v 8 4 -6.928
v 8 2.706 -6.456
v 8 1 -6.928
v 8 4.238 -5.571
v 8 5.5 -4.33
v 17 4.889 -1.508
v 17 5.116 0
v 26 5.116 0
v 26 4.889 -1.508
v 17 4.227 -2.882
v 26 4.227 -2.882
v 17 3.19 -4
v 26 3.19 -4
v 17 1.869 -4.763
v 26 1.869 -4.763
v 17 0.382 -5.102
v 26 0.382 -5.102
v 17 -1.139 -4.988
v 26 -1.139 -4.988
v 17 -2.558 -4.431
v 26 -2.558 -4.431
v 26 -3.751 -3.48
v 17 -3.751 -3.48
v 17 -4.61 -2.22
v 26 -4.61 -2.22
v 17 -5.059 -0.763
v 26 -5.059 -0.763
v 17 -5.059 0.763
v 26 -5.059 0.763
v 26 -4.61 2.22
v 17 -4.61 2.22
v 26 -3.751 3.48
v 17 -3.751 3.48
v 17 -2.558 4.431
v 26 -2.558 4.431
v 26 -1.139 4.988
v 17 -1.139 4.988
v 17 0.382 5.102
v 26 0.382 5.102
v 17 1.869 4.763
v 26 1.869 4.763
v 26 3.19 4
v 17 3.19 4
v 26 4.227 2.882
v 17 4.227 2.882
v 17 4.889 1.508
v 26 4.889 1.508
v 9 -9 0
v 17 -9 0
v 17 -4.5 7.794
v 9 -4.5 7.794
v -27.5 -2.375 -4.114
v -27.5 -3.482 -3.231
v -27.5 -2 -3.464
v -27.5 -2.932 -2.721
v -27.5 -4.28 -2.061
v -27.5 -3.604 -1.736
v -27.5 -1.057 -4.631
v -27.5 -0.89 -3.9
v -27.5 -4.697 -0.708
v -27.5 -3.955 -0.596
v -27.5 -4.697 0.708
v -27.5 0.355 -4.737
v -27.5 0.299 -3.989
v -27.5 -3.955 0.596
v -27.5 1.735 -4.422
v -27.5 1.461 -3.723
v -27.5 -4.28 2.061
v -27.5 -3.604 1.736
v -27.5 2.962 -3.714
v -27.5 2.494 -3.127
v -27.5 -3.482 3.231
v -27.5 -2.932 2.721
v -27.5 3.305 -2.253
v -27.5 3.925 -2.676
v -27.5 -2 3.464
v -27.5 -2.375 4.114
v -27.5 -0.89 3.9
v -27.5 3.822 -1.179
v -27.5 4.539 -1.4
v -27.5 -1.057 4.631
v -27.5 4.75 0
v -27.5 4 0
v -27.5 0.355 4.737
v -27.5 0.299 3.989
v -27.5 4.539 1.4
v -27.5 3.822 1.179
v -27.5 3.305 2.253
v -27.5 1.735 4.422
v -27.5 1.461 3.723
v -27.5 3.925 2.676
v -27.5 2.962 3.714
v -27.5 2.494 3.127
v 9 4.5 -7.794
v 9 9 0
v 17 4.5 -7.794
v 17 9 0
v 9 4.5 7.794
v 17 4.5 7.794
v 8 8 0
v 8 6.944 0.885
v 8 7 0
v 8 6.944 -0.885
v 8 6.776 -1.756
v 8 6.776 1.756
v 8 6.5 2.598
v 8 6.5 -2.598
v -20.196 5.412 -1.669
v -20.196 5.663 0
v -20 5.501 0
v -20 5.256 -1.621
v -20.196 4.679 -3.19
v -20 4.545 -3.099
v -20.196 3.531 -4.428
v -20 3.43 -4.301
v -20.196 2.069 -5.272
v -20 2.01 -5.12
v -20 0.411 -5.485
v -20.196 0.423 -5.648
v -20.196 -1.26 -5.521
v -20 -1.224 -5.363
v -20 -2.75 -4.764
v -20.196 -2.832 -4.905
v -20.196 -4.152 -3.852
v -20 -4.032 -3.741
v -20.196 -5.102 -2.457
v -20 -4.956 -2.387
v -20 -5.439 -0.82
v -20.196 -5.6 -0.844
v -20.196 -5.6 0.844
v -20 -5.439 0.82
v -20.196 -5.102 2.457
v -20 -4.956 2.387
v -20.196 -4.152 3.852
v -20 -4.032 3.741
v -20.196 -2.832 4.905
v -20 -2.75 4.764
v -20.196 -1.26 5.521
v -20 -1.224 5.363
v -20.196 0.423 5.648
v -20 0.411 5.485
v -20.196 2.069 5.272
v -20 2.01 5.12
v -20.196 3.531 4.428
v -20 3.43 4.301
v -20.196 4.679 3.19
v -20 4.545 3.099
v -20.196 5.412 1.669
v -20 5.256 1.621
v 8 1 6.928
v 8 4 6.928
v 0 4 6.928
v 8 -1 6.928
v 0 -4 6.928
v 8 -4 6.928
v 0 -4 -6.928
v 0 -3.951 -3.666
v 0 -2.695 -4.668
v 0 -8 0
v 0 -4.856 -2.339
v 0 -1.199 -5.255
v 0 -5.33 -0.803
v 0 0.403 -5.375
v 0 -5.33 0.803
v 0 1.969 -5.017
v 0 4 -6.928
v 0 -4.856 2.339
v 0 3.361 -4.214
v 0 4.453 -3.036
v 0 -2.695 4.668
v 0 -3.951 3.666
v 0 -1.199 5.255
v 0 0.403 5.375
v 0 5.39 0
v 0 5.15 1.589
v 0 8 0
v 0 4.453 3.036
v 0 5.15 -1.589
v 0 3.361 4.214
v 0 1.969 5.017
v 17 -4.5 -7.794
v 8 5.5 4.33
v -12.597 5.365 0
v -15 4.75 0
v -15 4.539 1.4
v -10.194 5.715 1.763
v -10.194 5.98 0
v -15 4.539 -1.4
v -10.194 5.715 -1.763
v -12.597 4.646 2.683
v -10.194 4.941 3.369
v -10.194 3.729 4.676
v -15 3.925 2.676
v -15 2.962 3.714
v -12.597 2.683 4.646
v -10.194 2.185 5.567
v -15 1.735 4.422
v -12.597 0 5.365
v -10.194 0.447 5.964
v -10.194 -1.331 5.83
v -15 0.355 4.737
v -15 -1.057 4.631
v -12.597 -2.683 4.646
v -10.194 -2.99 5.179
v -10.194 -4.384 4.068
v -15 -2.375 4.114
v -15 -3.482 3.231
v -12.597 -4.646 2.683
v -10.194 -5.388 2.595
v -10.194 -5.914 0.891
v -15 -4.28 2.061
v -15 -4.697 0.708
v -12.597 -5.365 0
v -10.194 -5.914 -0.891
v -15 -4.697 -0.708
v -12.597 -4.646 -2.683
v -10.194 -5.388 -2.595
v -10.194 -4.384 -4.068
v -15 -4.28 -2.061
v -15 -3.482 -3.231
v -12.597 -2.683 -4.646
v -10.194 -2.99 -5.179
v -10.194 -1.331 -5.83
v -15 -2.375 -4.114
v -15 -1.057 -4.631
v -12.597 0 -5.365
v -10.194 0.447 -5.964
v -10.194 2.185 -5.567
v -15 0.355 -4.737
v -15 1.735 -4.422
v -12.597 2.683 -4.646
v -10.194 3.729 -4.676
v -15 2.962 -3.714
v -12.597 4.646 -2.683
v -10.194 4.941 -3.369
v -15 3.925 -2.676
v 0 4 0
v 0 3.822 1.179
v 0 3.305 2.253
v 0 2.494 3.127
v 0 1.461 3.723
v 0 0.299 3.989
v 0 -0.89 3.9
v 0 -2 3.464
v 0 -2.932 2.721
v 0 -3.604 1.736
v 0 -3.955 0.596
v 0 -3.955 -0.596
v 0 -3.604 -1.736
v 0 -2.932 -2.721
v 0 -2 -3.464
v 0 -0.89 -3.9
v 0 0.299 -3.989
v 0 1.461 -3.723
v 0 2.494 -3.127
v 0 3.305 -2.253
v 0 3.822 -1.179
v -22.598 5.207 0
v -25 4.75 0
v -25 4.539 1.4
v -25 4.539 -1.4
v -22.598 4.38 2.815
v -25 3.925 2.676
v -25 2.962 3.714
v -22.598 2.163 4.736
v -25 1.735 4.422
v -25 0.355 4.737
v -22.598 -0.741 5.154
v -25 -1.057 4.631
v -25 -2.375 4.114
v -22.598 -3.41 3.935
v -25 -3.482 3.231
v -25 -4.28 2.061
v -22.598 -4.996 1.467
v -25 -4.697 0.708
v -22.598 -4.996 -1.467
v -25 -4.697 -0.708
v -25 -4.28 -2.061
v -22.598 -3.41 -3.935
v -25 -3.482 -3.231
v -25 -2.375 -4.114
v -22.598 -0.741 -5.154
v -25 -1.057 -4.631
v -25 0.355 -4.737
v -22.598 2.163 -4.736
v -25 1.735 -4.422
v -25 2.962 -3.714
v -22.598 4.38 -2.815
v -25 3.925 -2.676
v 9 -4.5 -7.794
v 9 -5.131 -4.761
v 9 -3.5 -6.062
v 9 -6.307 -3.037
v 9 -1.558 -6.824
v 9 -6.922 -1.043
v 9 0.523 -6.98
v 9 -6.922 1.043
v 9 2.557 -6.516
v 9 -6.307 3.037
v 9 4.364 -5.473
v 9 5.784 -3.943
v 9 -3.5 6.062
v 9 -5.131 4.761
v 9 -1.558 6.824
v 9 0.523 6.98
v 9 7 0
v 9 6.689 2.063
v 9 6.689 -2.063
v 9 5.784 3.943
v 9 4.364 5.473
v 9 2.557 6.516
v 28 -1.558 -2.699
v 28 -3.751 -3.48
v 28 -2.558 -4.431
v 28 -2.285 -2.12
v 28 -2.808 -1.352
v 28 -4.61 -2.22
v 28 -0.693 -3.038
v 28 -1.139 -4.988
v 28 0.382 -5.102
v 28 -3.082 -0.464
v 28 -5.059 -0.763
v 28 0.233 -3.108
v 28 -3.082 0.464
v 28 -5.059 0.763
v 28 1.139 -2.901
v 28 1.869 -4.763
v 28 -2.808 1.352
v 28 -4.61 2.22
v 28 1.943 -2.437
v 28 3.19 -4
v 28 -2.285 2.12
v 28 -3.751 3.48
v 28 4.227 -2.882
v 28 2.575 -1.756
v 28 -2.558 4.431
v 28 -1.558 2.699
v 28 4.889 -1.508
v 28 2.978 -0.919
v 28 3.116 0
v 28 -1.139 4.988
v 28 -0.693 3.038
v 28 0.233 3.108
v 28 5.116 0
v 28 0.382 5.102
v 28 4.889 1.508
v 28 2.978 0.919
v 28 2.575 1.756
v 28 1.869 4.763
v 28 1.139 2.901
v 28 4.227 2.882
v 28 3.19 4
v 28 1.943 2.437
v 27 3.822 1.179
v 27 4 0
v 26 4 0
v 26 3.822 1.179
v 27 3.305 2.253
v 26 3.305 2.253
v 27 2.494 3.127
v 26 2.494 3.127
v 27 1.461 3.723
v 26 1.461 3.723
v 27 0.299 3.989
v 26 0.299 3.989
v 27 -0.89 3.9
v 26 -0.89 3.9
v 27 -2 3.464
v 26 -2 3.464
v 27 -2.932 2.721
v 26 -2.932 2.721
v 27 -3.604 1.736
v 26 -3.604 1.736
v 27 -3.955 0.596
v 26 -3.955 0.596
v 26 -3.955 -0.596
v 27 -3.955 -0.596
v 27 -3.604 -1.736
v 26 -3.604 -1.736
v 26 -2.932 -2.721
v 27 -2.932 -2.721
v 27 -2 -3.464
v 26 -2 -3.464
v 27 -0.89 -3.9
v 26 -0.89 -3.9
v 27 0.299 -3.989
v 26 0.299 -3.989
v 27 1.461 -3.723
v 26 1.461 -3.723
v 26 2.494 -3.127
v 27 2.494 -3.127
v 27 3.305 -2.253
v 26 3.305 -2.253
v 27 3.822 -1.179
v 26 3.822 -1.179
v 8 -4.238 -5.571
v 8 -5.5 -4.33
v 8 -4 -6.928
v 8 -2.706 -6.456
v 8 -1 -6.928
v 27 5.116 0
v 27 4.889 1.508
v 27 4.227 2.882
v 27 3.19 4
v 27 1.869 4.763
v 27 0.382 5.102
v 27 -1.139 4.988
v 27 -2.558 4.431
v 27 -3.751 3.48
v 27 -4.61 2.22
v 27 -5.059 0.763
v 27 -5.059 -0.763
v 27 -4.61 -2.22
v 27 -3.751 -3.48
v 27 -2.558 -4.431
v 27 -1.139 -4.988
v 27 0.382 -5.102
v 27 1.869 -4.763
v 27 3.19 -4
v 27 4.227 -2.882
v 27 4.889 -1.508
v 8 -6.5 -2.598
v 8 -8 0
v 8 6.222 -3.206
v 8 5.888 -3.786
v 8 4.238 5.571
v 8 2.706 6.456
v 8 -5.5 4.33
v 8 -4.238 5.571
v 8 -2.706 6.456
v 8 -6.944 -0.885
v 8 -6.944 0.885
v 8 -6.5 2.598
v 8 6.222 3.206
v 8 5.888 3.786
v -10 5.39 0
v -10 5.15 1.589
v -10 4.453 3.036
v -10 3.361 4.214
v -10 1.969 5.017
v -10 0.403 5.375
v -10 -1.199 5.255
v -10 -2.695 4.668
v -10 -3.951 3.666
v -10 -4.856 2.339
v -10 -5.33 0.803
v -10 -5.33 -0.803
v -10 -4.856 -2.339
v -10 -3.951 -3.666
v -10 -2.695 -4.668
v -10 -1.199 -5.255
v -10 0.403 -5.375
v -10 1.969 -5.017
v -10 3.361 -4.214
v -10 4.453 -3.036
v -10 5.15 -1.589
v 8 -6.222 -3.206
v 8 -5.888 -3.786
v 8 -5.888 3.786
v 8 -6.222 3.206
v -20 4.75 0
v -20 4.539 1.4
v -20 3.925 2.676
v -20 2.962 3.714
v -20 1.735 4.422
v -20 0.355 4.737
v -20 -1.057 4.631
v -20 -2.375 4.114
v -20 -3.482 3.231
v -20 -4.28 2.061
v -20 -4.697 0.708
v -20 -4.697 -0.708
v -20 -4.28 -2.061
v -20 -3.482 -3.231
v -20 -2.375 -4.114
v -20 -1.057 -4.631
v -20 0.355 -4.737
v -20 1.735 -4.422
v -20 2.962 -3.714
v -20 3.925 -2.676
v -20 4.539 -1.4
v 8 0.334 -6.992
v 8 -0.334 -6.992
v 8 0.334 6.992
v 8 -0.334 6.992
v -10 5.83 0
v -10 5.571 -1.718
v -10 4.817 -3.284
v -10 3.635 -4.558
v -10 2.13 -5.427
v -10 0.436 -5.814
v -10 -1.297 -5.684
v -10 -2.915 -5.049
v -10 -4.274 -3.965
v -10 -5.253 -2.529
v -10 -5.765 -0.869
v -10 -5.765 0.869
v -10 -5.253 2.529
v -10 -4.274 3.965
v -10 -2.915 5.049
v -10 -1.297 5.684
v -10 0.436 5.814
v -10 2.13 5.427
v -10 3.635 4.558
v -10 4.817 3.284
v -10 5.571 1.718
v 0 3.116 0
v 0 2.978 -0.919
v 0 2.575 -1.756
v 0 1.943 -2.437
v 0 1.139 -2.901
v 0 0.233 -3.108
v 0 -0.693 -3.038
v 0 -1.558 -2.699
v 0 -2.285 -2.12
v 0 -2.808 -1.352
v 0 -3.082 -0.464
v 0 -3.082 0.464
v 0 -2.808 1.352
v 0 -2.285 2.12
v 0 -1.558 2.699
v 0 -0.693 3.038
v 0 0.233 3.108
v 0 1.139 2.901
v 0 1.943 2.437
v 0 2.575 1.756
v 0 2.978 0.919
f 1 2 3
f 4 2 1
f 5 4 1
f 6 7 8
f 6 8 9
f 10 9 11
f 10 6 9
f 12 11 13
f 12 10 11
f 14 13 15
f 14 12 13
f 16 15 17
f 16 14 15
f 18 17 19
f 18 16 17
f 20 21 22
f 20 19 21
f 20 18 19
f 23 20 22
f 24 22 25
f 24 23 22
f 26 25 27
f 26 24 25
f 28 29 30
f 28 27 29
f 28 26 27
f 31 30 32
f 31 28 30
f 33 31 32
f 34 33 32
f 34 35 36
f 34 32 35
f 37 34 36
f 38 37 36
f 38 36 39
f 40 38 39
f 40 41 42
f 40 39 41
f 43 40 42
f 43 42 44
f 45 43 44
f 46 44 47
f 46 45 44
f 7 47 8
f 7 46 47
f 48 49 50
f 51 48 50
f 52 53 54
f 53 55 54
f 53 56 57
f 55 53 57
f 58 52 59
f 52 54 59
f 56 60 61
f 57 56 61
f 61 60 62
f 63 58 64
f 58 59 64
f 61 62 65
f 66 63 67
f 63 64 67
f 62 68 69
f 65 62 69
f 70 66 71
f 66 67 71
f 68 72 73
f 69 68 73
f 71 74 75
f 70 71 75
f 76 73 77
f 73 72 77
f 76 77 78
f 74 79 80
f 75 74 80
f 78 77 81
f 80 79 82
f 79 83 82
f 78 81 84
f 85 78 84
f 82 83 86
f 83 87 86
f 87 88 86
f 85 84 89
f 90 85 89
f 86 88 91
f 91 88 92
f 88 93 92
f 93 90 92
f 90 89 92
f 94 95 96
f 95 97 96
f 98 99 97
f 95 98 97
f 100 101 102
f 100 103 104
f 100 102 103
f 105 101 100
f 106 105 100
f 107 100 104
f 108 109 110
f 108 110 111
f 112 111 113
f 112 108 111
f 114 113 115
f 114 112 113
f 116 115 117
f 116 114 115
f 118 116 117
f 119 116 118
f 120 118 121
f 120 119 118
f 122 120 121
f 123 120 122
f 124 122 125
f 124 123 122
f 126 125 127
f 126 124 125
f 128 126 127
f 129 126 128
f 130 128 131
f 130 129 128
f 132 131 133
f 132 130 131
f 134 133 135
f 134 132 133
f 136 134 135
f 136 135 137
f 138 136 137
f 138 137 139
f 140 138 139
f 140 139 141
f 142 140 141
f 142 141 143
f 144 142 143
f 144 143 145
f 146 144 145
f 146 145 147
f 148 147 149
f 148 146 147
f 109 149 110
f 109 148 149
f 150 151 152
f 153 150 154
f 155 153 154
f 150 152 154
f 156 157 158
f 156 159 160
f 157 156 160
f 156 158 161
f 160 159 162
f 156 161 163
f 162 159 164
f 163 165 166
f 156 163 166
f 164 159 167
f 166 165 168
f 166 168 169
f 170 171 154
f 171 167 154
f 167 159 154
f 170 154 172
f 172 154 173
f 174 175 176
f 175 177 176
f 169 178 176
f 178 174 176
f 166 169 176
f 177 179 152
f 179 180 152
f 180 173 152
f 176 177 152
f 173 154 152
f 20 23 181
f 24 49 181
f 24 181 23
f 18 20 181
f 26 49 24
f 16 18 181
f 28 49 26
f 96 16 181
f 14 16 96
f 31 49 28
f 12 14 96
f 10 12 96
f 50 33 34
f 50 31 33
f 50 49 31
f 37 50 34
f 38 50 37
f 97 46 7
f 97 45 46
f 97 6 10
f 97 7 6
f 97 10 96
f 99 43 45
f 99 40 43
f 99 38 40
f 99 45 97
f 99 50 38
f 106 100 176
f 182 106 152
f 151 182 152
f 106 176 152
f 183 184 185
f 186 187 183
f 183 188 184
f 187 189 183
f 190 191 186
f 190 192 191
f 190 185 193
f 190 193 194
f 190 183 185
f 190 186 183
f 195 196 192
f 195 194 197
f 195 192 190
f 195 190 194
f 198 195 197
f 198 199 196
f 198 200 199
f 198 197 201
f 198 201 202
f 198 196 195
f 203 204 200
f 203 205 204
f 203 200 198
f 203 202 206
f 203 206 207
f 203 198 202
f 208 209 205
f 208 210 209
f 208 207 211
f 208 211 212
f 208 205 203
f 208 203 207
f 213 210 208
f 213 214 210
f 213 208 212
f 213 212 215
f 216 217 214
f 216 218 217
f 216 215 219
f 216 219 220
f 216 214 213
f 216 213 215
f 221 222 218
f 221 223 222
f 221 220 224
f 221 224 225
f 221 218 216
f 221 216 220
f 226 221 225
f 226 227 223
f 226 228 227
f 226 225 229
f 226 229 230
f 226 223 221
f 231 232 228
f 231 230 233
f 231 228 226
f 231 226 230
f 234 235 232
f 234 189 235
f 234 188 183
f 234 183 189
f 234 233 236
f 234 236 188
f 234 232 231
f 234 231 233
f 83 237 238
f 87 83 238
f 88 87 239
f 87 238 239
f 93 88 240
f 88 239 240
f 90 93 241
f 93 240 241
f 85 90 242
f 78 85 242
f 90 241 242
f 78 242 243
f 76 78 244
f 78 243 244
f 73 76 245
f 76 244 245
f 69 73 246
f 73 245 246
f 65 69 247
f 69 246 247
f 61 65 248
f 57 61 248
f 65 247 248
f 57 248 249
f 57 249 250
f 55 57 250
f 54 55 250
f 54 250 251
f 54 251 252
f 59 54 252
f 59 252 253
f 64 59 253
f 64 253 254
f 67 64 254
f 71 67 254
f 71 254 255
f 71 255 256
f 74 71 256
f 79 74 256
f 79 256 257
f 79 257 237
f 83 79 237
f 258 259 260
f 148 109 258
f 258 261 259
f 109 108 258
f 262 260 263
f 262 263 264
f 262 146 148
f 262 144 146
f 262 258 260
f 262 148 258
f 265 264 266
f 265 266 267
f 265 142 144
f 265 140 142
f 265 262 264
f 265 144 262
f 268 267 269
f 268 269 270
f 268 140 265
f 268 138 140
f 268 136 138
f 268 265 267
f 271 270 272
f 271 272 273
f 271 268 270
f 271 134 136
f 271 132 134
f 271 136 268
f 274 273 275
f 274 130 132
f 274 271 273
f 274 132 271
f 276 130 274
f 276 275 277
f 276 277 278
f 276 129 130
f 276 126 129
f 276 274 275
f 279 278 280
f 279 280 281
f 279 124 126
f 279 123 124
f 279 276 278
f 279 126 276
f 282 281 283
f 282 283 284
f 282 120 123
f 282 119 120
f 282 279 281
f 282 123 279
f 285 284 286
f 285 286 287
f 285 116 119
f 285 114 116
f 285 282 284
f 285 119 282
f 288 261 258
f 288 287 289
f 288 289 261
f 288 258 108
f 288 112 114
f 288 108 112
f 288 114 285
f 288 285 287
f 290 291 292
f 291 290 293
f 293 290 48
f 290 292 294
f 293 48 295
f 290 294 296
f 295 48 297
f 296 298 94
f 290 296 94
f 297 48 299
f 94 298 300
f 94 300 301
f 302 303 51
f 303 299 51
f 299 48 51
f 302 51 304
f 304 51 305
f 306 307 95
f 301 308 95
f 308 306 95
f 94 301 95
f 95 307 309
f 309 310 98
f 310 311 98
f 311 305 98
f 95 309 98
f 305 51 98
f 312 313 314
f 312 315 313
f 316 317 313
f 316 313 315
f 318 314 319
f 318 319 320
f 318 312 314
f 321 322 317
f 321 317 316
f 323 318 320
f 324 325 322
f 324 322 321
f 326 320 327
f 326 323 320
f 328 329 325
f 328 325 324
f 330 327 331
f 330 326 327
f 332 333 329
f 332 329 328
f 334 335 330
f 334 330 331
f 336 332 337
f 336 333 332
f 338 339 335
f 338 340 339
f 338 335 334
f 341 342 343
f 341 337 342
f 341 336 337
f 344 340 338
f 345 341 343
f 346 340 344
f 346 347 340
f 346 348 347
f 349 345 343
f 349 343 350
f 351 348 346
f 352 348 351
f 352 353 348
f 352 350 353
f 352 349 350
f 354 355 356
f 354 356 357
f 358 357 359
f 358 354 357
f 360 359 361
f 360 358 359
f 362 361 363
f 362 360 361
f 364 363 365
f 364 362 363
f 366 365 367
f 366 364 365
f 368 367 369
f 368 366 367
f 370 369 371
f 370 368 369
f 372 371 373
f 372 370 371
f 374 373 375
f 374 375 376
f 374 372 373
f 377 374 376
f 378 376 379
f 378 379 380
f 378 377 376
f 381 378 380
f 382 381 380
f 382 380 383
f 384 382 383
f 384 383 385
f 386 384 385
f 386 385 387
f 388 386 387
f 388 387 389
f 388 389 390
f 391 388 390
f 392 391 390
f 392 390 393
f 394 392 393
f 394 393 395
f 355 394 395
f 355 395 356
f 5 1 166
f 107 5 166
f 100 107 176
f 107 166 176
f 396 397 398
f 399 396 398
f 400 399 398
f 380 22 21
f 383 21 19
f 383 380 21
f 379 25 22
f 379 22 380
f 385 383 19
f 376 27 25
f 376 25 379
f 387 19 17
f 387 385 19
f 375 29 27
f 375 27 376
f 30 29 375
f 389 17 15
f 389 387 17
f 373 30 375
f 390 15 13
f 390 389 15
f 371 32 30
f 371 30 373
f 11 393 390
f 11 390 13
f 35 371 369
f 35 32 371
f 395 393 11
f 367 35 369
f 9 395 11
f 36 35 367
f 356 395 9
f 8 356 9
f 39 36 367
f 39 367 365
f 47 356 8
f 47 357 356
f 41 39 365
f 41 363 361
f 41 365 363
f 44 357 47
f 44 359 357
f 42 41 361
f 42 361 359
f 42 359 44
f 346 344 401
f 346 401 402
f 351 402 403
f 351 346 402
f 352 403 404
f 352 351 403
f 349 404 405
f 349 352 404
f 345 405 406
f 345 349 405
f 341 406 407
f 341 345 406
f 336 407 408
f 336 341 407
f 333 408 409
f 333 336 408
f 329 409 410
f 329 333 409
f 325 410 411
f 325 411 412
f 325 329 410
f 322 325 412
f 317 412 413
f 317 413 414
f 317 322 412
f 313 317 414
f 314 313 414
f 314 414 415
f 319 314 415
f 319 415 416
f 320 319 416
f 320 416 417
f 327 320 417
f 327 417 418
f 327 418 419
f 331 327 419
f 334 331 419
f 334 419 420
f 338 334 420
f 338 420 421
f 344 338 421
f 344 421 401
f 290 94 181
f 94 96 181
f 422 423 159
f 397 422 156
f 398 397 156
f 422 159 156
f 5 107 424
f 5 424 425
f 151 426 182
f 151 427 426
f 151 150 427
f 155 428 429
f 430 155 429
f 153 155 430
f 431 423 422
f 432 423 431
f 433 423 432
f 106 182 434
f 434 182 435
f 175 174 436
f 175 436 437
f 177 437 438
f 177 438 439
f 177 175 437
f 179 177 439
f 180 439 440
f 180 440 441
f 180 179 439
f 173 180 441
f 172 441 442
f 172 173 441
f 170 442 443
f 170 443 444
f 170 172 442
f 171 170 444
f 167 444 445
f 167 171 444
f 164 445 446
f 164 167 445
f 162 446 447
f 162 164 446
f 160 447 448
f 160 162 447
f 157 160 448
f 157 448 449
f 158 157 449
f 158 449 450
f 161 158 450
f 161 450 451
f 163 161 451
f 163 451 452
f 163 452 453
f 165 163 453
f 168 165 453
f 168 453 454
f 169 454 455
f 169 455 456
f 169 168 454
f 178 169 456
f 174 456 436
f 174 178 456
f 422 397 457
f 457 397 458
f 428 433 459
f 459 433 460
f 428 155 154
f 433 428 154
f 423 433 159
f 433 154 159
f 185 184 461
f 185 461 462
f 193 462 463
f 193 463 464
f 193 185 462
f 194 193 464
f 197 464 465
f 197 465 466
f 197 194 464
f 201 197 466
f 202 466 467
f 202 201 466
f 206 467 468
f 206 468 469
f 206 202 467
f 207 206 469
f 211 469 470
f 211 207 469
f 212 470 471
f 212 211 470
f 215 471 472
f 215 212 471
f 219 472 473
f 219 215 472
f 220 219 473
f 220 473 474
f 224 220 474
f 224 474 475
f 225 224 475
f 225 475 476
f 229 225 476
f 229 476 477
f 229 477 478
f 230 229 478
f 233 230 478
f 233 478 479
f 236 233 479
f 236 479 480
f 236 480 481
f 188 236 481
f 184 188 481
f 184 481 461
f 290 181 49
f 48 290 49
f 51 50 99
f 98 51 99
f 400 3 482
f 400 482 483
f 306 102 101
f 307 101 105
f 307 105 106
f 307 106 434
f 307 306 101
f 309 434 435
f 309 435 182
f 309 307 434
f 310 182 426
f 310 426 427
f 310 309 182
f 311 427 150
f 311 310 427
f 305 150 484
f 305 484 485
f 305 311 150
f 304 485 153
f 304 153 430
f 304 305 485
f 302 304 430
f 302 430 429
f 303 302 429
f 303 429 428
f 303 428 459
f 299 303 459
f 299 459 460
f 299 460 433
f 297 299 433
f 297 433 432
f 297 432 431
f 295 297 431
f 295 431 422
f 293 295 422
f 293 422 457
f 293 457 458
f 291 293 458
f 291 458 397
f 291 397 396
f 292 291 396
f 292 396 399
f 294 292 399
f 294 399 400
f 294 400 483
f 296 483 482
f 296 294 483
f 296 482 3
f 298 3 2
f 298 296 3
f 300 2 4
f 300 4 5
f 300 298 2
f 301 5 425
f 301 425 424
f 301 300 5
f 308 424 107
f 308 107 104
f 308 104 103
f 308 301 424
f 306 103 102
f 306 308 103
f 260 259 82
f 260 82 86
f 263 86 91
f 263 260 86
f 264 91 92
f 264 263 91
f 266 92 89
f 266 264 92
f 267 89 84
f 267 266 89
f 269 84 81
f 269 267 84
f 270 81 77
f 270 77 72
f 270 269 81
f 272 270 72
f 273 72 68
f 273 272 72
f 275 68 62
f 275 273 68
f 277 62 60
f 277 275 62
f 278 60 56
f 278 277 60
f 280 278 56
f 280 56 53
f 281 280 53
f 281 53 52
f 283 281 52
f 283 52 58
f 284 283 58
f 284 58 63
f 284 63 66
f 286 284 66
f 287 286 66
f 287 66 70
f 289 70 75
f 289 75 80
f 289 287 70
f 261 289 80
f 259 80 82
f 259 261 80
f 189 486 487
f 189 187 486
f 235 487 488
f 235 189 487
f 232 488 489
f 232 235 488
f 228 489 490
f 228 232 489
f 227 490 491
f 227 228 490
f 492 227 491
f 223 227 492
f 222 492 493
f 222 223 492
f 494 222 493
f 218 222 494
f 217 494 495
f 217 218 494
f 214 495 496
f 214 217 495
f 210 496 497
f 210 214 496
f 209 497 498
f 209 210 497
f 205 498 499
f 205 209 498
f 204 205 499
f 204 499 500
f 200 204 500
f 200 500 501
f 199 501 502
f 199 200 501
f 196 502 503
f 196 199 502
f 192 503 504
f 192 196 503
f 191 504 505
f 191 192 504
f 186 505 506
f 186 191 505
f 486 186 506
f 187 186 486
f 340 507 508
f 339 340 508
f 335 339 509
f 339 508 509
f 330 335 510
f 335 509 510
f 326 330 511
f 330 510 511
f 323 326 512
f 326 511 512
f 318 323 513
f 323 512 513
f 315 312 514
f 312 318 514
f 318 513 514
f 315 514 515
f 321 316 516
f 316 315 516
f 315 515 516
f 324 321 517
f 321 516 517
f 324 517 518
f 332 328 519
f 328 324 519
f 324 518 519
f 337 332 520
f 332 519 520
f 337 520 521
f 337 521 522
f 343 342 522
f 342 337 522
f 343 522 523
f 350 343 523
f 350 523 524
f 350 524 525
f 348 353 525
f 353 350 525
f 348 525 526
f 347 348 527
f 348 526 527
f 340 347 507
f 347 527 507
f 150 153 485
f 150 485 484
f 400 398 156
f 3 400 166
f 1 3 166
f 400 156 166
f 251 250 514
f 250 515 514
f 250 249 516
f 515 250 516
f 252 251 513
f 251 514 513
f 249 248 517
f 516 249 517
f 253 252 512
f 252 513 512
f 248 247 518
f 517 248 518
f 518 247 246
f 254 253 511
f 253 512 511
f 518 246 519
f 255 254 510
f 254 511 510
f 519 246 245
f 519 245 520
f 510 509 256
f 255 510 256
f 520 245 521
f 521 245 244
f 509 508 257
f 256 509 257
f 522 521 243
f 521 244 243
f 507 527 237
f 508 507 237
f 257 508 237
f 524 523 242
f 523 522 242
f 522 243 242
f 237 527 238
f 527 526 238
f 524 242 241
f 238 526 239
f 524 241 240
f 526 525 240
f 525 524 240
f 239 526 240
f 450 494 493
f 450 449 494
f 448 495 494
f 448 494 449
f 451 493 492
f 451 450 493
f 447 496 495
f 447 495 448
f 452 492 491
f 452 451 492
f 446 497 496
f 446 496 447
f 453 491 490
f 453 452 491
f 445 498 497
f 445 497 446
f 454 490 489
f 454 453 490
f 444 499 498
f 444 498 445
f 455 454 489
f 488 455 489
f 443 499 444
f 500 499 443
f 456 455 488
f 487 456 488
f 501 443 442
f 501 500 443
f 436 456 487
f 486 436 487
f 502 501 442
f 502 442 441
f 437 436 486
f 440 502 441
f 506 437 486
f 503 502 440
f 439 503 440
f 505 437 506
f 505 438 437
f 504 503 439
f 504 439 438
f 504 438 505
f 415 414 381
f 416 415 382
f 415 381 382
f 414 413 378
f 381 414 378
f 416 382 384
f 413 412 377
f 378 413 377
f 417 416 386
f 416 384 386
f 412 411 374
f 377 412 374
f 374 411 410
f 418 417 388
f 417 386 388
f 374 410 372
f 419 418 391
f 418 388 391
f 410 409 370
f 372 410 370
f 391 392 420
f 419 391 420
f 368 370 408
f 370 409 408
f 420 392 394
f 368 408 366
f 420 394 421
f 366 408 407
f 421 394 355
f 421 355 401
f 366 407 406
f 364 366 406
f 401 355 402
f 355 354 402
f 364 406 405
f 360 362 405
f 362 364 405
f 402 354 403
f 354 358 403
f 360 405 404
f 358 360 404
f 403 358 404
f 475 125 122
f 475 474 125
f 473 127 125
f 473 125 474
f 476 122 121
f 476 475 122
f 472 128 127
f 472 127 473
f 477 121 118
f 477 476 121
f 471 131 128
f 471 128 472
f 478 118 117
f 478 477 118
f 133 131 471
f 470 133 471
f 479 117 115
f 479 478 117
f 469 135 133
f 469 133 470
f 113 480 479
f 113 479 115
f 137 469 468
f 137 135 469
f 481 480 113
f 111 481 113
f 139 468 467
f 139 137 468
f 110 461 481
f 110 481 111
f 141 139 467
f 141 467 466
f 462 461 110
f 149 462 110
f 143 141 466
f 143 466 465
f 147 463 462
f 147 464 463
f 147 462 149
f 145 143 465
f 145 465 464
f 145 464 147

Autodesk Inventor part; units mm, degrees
ref_plane "YZ Plane" through (0, 0, 0) normal (1, 0, 0) x (0, 1, 0)
ref_plane "XZ Plane" through (0, 0, 0) normal (0, 1, 0) x (-1, 0, 0)
ref_plane "XY Plane" through (0, 0, 0) normal (0, 0, 1) x (1, 0, 0)
sketch "Sketch1" plane through (0, 0, 0) normal (0, 0, 1) x (1, 0, 0)
  line L0 (-20, 4.75) -> (-20, 5.7007)
  line L1 (-20, 5.7007) -> (-25, 4.75)
  line L2 (-20, 4.75) -> (-15, 4.75)
  line L3 (-10, 6.0299) -> (-15, 4.75)
  line L4 (-10, 5.3899) -> (0, 5.3899)
  line L5 (-10, 6.0299) -> (-10, 5.3899)
  line L6 (-27.5, 4.75) -> (-27.5, 4)
  line L7 (-27.5, 4.75) -> (-25, 4.75)
  line L8 (-27.5, 4) -> (0, 4)
  line L9 (0, 8) -> (8, 8)
  line L10 (0, 8) -> (0, 5.3899)
  line L11 (8, 8) -> (8, 7)
  line L12 (8, 7) -> (9, 7)
  line L13 (9, 9) -> (17, 9)
  line L14 (26, 3.1165) -> (0, 3.1165)
  line L15 (0, 4) -> (0, 3.1165)
  line L16 (9, 9) -> (9, 7)
  line L17 (26, 4) -> (26, 5.1165)
  line L18 (26, 5.1165) -> (17, 5.1165)
  line L19 (17, 5.1165) -> (17, 9)
  line L20 (26, 4) -> (27, 4)
  line L21 (27, 4) -> (27, 5.1165)
  line L22 (27, 5.1165) -> (28, 5.1165)
  line L23 (28, 5.1165) -> (28, 3.1165)
  line L24 (28, 3.1165) -> (26, 3.1165)
  line L25 (-35.0249, 0) -> (33.4829, 0)
  point P0 (0, 0)
  point P1 (0, 4.75)
  point P2 (13, 7)
  dimension "d3" = 5
  dimension "d4" = 5
  dimension "d14" = 0.75
  dimension "d15" = 1
  dimension "d16" = 8
  dimension "d26" = 2
  dimension "d27" = 1
  dimension "d28" = 1
sketch "Sketch2" plane through (0, 0, 0) normal (0, 0, 1) x (1, 0, 0)
  point P0 (0, 0)
sketch "Sketch3" plane through (0, 0, 0) normal (0, 0, 1) x (1, 0, 0)
  point P0 (0, 0)
sketch "Sketch4" plane through (0, 0, 0) normal (0, 0, 1) x (1, 0, 0)
  point P0 (0, 0)
sketch "Sketch5" plane through (0, 0, 0) normal (1, 0, 0) x (0, 1, 0)
  point P0 (0, 0)
sketch "Sketch6" plane through (0, 0, 0) normal (0, 0, 1) x (1, 0, 0)
  line L0 (8.9873, 9.0104) -> (8.9873, 6.9688)
  point P0 (0, 0)
sketch "Sketch7" plane through (0, 0, 0) normal (0, 0, 1) x (1, 0, 0)
  point P0 (0, 0)
sketch "Sketch8" plane through (0, 0, 0) normal (0, 0, 1) x (1, 0, 0)
  point P0 (0, 0)
revolve "Revolution1" add sketch "Sketch1" angle 360 about axis through (-35.0249, 0, 0) along (1, 0, 0)
sketch "Sketch9" plane through (17, 0, 0) normal (1, 0, 0) x (0, 0, -1)
  circle A0 centre (0, 0) radius 7 projected
  circle A1 centre (0, 0) radius 9 projected
  circle A2 centre (0, 0) radius 9 projected
  circle A3 centre (0, 0) radius 5.1165 projected
  circle A4 centre (0, 0) radius 3.1165 projected
  circle A5 centre (0, 0) radius 5.7007 projected
  line L0 (0, 9) -> (7.7942, 4.5)
  line L1 (7.7942, 4.5) -> (7.7942, -4.5)
  line L2 (7.7942, -4.5) -> (0, -9)
  line L3 (0, -9) -> (-7.7942, -4.5)
  line L4 (-7.7942, -4.5) -> (-7.7942, 4.5)
  line L5 (-7.7942, 4.5) -> (0, 9)
  point P0 (0, -9)
  point P1 (0, -9)
  point P2 (7.7942, -4.5)
  point P3 (7.7942, -4.5)
extrude "Extrusion1" cut sketch "Sketch9" against normal blind 8 contours A1 L1 | L0 A1 | A1 L2 | L5 A1 | A1 L3 | L4 A1
sketch "Sketch10" plane through (0, 0, 0) normal (-1, 0, 0) x (0, 0, 1)
  circle A0 centre (0, 0) radius 5.3899 projected
  circle A1 centre (0, 0) radius 8 projected
  circle A2 centre (0, 0) radius 3.1165 projected
  circle A3 centre (0, 0) radius 4 projected
  circle A4 centre (0, 0) radius 5.3899 projected
  circle A5 centre (0, 0) radius 8 projected
  circle A6 centre (0, 0) radius 3.1165 projected
  circle A7 centre (0, 0) radius 4 projected
  circle A8 centre (0, 0) radius 8 projected
  line L0 (6.9282, -4) -> (0, -8)
  line L1 (0, -8) -> (-6.9282, -4)
  line L2 (-6.9282, -4) -> (-6.9282, 4)
  line L3 (-6.9282, 4) -> (0, 8)
  line L4 (0, 8) -> (6.9282, 4)
  line L5 (6.9282, 4) -> (6.9282, -4)
  point P0 (0, 8)
  point P1 (0, 8)
  point P2 (-6.9282, 4)
  point P3 (-6.9282, 4)
  point P4 (0, -8)
  point P5 (0, -8)
extrude "Extrusion2" cut sketch "Sketch10" against normal blind 8 contours A1 L5 | L4 A1 | A1 L0 | L3 A1 | A1 L1 | L2 A1
chamfer "Chamfer1" distance 0.2 angle 45 1 edges at (-20, -5.7007, 0)
chamfer "Chamfer2" distance 0.2 angle 45 1 edges at (-10, -6.0299, 0)
properties part number "sambungan cilek ng gede"
